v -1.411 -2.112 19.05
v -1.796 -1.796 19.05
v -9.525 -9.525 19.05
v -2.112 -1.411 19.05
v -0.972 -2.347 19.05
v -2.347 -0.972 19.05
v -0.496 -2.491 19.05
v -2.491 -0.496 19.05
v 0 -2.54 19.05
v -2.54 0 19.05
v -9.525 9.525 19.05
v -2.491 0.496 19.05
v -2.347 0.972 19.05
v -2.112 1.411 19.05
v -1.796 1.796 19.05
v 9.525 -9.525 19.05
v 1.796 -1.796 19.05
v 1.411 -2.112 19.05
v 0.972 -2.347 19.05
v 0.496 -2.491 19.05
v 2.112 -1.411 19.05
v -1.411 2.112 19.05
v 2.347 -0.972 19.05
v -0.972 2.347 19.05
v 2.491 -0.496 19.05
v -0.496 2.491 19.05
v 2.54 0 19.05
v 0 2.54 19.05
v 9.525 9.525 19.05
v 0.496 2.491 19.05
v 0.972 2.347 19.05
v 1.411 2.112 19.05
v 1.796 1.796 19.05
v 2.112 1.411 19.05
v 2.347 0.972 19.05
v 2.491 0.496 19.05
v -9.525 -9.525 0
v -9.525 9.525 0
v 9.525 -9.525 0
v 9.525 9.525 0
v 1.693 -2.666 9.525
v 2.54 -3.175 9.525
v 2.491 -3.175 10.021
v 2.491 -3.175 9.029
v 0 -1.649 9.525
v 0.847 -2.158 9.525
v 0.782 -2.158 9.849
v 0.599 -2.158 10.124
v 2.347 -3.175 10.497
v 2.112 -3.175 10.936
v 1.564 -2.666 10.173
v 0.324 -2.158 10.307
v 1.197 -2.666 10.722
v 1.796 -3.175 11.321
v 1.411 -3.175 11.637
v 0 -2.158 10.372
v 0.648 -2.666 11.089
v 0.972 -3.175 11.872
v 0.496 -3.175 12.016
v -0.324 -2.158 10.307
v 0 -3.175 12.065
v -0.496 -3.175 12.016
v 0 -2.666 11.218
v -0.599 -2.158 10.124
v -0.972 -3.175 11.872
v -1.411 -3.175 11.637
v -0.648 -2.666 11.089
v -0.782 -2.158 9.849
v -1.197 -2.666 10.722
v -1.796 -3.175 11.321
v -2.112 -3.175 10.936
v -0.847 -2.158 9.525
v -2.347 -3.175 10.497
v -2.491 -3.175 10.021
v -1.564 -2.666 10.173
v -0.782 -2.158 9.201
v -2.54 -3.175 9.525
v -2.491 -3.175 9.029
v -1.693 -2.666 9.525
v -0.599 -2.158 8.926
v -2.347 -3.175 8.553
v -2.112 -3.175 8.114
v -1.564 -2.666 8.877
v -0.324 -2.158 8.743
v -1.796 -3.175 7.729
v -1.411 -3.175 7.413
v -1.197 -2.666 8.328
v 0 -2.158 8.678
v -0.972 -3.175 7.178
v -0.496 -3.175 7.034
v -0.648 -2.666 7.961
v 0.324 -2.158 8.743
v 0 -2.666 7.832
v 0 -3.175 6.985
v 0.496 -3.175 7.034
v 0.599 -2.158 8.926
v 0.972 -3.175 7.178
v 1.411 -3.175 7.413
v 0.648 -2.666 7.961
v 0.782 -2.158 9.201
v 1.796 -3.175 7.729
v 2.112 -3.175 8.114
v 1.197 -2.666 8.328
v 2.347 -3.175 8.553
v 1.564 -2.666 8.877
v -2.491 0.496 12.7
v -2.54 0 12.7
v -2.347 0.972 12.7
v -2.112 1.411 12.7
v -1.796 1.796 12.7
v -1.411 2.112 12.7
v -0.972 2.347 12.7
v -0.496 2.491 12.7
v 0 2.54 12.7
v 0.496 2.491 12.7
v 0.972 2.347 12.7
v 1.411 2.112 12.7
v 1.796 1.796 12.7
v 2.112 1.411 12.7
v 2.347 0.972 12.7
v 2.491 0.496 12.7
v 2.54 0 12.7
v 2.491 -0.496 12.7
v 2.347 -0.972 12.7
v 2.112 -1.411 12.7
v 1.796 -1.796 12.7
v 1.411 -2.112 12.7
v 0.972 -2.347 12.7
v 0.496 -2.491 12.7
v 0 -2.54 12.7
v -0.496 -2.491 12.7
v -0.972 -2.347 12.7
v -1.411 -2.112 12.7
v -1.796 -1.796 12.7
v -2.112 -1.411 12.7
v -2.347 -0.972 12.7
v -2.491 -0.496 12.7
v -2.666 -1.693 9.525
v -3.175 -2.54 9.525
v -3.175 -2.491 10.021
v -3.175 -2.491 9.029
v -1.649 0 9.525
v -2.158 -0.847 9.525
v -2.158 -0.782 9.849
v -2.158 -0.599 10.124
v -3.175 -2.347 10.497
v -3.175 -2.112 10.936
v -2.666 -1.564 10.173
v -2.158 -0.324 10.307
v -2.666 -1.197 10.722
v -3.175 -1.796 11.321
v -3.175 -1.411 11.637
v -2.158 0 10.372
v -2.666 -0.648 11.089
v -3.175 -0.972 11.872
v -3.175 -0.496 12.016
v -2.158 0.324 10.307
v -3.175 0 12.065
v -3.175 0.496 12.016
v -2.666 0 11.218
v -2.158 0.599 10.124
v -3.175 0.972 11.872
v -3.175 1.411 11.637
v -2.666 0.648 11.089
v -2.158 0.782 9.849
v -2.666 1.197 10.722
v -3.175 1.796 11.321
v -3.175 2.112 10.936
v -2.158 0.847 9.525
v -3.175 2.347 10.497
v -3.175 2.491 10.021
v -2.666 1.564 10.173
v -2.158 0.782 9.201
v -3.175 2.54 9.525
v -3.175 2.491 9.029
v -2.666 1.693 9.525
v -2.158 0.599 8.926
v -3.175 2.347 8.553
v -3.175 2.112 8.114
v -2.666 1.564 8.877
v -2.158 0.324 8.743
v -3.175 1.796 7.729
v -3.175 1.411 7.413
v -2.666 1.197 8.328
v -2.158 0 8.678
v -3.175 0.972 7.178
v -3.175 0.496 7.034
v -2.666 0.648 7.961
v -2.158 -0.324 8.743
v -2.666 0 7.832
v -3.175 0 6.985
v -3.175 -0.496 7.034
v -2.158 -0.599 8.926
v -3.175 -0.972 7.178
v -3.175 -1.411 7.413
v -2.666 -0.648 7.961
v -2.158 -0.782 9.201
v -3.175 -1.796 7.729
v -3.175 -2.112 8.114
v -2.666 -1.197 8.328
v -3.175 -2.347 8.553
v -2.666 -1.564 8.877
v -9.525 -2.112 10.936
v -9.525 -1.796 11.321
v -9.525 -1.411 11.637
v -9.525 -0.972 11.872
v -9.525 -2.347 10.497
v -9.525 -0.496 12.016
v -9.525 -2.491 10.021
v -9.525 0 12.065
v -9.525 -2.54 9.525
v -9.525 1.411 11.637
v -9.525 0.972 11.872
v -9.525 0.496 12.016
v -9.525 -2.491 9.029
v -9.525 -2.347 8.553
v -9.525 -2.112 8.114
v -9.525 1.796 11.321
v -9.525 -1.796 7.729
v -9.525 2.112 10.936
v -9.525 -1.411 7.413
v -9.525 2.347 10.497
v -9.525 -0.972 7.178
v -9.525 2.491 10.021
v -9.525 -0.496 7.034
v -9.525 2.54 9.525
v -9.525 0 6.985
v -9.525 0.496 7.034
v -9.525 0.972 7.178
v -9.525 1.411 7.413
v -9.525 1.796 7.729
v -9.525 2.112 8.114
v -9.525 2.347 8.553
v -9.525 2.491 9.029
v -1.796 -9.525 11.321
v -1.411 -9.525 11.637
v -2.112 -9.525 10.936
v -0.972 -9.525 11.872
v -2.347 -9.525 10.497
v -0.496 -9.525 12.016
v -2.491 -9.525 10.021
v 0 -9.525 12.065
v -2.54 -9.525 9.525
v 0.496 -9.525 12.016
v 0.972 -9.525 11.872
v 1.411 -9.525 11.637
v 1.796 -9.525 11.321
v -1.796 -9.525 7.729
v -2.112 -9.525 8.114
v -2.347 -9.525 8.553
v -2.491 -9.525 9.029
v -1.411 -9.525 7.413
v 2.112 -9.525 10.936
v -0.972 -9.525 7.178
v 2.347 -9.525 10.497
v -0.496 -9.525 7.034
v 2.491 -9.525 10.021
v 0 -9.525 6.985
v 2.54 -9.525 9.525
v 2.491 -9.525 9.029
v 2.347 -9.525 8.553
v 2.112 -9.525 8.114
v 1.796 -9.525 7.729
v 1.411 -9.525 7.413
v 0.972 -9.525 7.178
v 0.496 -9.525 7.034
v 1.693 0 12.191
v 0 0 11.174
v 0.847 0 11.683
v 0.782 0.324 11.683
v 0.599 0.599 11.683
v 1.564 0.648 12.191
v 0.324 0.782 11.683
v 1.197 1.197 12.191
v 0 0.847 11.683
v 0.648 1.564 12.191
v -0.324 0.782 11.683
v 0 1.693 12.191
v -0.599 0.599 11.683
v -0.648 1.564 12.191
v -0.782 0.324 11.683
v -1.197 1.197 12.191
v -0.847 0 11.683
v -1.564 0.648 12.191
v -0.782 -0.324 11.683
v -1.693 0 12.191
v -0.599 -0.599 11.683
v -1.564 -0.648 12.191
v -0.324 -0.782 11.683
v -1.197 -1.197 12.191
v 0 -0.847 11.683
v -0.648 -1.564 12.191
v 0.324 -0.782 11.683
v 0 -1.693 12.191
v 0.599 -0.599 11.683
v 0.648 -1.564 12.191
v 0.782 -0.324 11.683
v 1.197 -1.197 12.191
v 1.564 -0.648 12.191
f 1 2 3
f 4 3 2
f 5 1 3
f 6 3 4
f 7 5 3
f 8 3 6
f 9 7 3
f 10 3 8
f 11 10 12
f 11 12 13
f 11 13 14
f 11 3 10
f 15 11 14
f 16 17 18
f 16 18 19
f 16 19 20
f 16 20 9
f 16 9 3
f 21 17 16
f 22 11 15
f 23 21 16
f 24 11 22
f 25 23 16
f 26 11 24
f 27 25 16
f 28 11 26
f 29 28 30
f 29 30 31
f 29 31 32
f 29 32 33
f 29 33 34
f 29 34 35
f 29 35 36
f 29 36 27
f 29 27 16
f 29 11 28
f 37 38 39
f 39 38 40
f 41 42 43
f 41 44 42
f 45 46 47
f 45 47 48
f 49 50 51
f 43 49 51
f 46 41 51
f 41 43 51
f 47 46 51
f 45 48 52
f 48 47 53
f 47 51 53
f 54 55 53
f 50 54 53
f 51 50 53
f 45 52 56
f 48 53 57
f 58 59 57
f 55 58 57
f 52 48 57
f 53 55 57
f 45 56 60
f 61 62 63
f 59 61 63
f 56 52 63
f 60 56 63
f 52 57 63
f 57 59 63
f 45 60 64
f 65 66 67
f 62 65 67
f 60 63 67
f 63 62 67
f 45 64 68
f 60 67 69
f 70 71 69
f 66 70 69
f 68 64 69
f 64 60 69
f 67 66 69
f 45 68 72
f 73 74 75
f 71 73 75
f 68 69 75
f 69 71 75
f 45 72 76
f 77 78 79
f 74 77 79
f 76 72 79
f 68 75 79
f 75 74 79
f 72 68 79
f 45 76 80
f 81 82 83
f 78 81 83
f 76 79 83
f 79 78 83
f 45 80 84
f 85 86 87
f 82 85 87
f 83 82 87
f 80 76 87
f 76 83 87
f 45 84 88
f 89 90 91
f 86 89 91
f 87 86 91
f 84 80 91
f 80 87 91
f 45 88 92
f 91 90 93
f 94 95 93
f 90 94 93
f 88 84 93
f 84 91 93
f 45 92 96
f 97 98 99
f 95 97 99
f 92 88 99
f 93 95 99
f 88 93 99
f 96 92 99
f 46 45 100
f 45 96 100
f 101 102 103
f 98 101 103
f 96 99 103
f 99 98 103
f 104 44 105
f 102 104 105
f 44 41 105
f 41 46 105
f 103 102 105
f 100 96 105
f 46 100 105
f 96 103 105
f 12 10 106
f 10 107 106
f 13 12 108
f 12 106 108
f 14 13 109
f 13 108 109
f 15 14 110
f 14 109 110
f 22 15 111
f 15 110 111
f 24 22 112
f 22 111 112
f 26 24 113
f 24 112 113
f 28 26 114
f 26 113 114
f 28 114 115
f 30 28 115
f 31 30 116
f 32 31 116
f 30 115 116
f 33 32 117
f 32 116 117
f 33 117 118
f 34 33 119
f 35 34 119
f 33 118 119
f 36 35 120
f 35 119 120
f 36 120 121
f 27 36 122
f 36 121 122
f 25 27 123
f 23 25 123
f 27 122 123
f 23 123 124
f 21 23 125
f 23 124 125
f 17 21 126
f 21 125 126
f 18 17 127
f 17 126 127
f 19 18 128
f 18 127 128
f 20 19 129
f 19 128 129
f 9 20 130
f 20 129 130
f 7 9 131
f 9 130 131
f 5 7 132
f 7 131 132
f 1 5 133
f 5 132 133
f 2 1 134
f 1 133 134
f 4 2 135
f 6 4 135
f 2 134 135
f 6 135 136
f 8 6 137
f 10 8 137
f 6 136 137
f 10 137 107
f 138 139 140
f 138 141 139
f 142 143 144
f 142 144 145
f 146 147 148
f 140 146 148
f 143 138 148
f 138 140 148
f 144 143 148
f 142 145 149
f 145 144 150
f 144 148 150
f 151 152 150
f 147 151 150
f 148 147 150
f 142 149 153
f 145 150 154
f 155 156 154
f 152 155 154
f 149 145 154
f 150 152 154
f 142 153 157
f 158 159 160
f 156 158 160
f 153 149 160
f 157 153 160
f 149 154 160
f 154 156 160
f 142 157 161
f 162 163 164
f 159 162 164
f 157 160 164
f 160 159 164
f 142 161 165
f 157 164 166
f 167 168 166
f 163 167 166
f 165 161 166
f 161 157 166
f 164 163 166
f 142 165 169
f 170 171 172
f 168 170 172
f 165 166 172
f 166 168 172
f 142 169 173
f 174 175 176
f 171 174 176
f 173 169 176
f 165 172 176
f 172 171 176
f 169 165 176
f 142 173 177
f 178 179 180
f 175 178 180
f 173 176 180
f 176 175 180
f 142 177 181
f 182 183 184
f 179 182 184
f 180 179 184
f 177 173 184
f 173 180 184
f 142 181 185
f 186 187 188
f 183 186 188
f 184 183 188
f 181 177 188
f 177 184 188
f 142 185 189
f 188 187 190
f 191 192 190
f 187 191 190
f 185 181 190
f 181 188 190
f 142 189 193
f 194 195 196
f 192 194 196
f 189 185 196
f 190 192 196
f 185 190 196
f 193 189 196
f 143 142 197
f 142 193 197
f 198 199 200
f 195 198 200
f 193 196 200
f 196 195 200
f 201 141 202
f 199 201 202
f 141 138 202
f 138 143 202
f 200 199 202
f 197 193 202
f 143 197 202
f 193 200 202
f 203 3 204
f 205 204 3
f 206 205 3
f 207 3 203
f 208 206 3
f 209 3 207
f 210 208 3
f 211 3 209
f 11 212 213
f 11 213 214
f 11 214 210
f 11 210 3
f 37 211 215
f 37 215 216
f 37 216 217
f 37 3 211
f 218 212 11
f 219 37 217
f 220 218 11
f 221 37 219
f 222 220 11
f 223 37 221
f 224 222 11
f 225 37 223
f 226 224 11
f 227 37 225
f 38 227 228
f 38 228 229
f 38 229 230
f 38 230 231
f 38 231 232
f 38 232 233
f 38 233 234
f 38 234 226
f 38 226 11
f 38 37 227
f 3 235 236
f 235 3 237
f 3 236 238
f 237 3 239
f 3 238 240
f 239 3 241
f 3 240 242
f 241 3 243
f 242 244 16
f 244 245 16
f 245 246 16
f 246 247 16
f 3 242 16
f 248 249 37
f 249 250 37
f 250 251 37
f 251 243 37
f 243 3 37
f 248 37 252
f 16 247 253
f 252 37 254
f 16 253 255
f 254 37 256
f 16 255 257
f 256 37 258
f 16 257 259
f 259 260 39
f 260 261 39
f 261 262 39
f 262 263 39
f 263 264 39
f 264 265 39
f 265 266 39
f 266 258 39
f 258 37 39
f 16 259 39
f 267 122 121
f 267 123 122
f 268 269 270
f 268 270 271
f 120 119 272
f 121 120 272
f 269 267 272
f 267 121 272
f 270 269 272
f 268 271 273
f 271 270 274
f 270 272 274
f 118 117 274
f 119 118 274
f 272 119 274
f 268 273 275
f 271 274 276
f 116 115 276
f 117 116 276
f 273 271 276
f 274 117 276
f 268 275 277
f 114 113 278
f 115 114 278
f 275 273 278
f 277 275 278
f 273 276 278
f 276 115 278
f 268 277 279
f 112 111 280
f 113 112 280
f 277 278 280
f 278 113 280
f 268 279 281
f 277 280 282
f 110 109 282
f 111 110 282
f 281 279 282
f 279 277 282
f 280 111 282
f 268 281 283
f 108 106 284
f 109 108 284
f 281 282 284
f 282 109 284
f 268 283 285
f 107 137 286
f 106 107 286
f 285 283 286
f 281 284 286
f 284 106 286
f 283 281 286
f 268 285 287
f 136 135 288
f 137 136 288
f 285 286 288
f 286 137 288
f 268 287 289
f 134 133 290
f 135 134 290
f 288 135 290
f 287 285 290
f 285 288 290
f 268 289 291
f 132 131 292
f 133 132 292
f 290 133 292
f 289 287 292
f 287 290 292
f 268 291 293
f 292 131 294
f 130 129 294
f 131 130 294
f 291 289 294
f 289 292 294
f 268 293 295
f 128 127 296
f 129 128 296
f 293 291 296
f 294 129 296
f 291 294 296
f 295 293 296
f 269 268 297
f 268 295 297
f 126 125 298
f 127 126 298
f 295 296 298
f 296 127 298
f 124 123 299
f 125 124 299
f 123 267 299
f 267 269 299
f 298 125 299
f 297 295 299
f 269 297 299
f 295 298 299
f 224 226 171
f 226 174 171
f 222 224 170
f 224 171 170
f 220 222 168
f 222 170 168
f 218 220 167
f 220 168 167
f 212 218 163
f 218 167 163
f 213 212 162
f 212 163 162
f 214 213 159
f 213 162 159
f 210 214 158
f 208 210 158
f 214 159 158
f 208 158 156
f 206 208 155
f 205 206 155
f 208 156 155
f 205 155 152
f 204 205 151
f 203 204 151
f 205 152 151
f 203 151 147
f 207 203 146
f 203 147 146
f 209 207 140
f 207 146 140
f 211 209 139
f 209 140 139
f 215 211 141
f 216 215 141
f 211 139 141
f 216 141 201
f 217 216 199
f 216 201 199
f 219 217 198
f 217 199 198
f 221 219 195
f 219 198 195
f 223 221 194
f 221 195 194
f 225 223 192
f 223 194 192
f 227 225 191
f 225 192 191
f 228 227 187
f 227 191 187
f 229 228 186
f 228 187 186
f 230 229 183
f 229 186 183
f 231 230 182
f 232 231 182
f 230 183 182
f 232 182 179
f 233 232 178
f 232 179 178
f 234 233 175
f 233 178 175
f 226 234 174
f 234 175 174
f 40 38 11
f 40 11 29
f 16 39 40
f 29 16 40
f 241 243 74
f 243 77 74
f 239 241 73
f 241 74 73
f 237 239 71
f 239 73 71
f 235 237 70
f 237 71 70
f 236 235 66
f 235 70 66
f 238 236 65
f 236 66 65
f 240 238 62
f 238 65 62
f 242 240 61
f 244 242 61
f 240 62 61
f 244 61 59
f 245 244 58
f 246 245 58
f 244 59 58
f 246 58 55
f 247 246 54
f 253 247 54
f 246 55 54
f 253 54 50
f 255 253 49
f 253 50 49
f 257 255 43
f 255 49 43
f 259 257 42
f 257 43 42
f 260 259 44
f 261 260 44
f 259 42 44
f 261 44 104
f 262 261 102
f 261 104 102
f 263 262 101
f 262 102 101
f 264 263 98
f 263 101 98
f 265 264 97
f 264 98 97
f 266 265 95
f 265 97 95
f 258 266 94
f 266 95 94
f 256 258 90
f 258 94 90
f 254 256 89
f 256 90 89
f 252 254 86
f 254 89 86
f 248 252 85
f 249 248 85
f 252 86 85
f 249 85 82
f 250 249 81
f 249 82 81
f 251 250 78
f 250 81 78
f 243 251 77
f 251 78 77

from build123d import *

# Parameters (mm, degrees)
F0_W     = 19.05
F0_H     = 19.05
F1_DEPTH = 19.05
F3_D     = 5.08
F3_DEPTH = 6.35
F3_TIP   = 1.5261859723
F5_D     = 5.08
F5_DEPTH = 6.35
F5_TIP   = 1.5261859723
F7_D     = 5.08
F7_DEPTH = 6.35
F7_TIP   = 1.5261859723


with BuildPart() as f1:
    # F0 (on Top) → F1 (new body)
    with BuildSketch(Plane.XY):
        Rectangle(F0_W, F0_H)
    extrude(amount=F1_DEPTH)

    # F3
    with Locations(Plane.XZ.offset(9.525)):
        with Locations((0, 9.525)):
            Hole(F3_D / 2, depth=F3_DEPTH)
            with Locations((0, 0, -(F3_DEPTH + F3_TIP / 2))):  # 118° drill point
                Cone(0, F3_D / 2, F3_TIP, mode=Mode.SUBTRACT)

    # F5
    with Locations(Plane(origin=(-9.525, 0, 0), x_dir=(0, -1, 0), z_dir=(-1, 0, 0))):
        with Locations((0, 9.525)):
            Hole(F5_D / 2, depth=F5_DEPTH)
            with Locations((0, 0, -(F5_DEPTH + F5_TIP / 2))):  # 118° drill point
                Cone(0, F5_D / 2, F5_TIP, mode=Mode.SUBTRACT)

    # F7
    with Locations(Plane.XY.offset(19.05)):
        with Locations((0, 0)):
            Hole(F7_D / 2, depth=F7_DEPTH)
            with Locations((0, 0, -(F7_DEPTH + F7_TIP / 2))):  # 118° drill point
                Cone(0, F7_D / 2, F7_TIP, mode=Mode.SUBTRACT)


solid = f1.part
